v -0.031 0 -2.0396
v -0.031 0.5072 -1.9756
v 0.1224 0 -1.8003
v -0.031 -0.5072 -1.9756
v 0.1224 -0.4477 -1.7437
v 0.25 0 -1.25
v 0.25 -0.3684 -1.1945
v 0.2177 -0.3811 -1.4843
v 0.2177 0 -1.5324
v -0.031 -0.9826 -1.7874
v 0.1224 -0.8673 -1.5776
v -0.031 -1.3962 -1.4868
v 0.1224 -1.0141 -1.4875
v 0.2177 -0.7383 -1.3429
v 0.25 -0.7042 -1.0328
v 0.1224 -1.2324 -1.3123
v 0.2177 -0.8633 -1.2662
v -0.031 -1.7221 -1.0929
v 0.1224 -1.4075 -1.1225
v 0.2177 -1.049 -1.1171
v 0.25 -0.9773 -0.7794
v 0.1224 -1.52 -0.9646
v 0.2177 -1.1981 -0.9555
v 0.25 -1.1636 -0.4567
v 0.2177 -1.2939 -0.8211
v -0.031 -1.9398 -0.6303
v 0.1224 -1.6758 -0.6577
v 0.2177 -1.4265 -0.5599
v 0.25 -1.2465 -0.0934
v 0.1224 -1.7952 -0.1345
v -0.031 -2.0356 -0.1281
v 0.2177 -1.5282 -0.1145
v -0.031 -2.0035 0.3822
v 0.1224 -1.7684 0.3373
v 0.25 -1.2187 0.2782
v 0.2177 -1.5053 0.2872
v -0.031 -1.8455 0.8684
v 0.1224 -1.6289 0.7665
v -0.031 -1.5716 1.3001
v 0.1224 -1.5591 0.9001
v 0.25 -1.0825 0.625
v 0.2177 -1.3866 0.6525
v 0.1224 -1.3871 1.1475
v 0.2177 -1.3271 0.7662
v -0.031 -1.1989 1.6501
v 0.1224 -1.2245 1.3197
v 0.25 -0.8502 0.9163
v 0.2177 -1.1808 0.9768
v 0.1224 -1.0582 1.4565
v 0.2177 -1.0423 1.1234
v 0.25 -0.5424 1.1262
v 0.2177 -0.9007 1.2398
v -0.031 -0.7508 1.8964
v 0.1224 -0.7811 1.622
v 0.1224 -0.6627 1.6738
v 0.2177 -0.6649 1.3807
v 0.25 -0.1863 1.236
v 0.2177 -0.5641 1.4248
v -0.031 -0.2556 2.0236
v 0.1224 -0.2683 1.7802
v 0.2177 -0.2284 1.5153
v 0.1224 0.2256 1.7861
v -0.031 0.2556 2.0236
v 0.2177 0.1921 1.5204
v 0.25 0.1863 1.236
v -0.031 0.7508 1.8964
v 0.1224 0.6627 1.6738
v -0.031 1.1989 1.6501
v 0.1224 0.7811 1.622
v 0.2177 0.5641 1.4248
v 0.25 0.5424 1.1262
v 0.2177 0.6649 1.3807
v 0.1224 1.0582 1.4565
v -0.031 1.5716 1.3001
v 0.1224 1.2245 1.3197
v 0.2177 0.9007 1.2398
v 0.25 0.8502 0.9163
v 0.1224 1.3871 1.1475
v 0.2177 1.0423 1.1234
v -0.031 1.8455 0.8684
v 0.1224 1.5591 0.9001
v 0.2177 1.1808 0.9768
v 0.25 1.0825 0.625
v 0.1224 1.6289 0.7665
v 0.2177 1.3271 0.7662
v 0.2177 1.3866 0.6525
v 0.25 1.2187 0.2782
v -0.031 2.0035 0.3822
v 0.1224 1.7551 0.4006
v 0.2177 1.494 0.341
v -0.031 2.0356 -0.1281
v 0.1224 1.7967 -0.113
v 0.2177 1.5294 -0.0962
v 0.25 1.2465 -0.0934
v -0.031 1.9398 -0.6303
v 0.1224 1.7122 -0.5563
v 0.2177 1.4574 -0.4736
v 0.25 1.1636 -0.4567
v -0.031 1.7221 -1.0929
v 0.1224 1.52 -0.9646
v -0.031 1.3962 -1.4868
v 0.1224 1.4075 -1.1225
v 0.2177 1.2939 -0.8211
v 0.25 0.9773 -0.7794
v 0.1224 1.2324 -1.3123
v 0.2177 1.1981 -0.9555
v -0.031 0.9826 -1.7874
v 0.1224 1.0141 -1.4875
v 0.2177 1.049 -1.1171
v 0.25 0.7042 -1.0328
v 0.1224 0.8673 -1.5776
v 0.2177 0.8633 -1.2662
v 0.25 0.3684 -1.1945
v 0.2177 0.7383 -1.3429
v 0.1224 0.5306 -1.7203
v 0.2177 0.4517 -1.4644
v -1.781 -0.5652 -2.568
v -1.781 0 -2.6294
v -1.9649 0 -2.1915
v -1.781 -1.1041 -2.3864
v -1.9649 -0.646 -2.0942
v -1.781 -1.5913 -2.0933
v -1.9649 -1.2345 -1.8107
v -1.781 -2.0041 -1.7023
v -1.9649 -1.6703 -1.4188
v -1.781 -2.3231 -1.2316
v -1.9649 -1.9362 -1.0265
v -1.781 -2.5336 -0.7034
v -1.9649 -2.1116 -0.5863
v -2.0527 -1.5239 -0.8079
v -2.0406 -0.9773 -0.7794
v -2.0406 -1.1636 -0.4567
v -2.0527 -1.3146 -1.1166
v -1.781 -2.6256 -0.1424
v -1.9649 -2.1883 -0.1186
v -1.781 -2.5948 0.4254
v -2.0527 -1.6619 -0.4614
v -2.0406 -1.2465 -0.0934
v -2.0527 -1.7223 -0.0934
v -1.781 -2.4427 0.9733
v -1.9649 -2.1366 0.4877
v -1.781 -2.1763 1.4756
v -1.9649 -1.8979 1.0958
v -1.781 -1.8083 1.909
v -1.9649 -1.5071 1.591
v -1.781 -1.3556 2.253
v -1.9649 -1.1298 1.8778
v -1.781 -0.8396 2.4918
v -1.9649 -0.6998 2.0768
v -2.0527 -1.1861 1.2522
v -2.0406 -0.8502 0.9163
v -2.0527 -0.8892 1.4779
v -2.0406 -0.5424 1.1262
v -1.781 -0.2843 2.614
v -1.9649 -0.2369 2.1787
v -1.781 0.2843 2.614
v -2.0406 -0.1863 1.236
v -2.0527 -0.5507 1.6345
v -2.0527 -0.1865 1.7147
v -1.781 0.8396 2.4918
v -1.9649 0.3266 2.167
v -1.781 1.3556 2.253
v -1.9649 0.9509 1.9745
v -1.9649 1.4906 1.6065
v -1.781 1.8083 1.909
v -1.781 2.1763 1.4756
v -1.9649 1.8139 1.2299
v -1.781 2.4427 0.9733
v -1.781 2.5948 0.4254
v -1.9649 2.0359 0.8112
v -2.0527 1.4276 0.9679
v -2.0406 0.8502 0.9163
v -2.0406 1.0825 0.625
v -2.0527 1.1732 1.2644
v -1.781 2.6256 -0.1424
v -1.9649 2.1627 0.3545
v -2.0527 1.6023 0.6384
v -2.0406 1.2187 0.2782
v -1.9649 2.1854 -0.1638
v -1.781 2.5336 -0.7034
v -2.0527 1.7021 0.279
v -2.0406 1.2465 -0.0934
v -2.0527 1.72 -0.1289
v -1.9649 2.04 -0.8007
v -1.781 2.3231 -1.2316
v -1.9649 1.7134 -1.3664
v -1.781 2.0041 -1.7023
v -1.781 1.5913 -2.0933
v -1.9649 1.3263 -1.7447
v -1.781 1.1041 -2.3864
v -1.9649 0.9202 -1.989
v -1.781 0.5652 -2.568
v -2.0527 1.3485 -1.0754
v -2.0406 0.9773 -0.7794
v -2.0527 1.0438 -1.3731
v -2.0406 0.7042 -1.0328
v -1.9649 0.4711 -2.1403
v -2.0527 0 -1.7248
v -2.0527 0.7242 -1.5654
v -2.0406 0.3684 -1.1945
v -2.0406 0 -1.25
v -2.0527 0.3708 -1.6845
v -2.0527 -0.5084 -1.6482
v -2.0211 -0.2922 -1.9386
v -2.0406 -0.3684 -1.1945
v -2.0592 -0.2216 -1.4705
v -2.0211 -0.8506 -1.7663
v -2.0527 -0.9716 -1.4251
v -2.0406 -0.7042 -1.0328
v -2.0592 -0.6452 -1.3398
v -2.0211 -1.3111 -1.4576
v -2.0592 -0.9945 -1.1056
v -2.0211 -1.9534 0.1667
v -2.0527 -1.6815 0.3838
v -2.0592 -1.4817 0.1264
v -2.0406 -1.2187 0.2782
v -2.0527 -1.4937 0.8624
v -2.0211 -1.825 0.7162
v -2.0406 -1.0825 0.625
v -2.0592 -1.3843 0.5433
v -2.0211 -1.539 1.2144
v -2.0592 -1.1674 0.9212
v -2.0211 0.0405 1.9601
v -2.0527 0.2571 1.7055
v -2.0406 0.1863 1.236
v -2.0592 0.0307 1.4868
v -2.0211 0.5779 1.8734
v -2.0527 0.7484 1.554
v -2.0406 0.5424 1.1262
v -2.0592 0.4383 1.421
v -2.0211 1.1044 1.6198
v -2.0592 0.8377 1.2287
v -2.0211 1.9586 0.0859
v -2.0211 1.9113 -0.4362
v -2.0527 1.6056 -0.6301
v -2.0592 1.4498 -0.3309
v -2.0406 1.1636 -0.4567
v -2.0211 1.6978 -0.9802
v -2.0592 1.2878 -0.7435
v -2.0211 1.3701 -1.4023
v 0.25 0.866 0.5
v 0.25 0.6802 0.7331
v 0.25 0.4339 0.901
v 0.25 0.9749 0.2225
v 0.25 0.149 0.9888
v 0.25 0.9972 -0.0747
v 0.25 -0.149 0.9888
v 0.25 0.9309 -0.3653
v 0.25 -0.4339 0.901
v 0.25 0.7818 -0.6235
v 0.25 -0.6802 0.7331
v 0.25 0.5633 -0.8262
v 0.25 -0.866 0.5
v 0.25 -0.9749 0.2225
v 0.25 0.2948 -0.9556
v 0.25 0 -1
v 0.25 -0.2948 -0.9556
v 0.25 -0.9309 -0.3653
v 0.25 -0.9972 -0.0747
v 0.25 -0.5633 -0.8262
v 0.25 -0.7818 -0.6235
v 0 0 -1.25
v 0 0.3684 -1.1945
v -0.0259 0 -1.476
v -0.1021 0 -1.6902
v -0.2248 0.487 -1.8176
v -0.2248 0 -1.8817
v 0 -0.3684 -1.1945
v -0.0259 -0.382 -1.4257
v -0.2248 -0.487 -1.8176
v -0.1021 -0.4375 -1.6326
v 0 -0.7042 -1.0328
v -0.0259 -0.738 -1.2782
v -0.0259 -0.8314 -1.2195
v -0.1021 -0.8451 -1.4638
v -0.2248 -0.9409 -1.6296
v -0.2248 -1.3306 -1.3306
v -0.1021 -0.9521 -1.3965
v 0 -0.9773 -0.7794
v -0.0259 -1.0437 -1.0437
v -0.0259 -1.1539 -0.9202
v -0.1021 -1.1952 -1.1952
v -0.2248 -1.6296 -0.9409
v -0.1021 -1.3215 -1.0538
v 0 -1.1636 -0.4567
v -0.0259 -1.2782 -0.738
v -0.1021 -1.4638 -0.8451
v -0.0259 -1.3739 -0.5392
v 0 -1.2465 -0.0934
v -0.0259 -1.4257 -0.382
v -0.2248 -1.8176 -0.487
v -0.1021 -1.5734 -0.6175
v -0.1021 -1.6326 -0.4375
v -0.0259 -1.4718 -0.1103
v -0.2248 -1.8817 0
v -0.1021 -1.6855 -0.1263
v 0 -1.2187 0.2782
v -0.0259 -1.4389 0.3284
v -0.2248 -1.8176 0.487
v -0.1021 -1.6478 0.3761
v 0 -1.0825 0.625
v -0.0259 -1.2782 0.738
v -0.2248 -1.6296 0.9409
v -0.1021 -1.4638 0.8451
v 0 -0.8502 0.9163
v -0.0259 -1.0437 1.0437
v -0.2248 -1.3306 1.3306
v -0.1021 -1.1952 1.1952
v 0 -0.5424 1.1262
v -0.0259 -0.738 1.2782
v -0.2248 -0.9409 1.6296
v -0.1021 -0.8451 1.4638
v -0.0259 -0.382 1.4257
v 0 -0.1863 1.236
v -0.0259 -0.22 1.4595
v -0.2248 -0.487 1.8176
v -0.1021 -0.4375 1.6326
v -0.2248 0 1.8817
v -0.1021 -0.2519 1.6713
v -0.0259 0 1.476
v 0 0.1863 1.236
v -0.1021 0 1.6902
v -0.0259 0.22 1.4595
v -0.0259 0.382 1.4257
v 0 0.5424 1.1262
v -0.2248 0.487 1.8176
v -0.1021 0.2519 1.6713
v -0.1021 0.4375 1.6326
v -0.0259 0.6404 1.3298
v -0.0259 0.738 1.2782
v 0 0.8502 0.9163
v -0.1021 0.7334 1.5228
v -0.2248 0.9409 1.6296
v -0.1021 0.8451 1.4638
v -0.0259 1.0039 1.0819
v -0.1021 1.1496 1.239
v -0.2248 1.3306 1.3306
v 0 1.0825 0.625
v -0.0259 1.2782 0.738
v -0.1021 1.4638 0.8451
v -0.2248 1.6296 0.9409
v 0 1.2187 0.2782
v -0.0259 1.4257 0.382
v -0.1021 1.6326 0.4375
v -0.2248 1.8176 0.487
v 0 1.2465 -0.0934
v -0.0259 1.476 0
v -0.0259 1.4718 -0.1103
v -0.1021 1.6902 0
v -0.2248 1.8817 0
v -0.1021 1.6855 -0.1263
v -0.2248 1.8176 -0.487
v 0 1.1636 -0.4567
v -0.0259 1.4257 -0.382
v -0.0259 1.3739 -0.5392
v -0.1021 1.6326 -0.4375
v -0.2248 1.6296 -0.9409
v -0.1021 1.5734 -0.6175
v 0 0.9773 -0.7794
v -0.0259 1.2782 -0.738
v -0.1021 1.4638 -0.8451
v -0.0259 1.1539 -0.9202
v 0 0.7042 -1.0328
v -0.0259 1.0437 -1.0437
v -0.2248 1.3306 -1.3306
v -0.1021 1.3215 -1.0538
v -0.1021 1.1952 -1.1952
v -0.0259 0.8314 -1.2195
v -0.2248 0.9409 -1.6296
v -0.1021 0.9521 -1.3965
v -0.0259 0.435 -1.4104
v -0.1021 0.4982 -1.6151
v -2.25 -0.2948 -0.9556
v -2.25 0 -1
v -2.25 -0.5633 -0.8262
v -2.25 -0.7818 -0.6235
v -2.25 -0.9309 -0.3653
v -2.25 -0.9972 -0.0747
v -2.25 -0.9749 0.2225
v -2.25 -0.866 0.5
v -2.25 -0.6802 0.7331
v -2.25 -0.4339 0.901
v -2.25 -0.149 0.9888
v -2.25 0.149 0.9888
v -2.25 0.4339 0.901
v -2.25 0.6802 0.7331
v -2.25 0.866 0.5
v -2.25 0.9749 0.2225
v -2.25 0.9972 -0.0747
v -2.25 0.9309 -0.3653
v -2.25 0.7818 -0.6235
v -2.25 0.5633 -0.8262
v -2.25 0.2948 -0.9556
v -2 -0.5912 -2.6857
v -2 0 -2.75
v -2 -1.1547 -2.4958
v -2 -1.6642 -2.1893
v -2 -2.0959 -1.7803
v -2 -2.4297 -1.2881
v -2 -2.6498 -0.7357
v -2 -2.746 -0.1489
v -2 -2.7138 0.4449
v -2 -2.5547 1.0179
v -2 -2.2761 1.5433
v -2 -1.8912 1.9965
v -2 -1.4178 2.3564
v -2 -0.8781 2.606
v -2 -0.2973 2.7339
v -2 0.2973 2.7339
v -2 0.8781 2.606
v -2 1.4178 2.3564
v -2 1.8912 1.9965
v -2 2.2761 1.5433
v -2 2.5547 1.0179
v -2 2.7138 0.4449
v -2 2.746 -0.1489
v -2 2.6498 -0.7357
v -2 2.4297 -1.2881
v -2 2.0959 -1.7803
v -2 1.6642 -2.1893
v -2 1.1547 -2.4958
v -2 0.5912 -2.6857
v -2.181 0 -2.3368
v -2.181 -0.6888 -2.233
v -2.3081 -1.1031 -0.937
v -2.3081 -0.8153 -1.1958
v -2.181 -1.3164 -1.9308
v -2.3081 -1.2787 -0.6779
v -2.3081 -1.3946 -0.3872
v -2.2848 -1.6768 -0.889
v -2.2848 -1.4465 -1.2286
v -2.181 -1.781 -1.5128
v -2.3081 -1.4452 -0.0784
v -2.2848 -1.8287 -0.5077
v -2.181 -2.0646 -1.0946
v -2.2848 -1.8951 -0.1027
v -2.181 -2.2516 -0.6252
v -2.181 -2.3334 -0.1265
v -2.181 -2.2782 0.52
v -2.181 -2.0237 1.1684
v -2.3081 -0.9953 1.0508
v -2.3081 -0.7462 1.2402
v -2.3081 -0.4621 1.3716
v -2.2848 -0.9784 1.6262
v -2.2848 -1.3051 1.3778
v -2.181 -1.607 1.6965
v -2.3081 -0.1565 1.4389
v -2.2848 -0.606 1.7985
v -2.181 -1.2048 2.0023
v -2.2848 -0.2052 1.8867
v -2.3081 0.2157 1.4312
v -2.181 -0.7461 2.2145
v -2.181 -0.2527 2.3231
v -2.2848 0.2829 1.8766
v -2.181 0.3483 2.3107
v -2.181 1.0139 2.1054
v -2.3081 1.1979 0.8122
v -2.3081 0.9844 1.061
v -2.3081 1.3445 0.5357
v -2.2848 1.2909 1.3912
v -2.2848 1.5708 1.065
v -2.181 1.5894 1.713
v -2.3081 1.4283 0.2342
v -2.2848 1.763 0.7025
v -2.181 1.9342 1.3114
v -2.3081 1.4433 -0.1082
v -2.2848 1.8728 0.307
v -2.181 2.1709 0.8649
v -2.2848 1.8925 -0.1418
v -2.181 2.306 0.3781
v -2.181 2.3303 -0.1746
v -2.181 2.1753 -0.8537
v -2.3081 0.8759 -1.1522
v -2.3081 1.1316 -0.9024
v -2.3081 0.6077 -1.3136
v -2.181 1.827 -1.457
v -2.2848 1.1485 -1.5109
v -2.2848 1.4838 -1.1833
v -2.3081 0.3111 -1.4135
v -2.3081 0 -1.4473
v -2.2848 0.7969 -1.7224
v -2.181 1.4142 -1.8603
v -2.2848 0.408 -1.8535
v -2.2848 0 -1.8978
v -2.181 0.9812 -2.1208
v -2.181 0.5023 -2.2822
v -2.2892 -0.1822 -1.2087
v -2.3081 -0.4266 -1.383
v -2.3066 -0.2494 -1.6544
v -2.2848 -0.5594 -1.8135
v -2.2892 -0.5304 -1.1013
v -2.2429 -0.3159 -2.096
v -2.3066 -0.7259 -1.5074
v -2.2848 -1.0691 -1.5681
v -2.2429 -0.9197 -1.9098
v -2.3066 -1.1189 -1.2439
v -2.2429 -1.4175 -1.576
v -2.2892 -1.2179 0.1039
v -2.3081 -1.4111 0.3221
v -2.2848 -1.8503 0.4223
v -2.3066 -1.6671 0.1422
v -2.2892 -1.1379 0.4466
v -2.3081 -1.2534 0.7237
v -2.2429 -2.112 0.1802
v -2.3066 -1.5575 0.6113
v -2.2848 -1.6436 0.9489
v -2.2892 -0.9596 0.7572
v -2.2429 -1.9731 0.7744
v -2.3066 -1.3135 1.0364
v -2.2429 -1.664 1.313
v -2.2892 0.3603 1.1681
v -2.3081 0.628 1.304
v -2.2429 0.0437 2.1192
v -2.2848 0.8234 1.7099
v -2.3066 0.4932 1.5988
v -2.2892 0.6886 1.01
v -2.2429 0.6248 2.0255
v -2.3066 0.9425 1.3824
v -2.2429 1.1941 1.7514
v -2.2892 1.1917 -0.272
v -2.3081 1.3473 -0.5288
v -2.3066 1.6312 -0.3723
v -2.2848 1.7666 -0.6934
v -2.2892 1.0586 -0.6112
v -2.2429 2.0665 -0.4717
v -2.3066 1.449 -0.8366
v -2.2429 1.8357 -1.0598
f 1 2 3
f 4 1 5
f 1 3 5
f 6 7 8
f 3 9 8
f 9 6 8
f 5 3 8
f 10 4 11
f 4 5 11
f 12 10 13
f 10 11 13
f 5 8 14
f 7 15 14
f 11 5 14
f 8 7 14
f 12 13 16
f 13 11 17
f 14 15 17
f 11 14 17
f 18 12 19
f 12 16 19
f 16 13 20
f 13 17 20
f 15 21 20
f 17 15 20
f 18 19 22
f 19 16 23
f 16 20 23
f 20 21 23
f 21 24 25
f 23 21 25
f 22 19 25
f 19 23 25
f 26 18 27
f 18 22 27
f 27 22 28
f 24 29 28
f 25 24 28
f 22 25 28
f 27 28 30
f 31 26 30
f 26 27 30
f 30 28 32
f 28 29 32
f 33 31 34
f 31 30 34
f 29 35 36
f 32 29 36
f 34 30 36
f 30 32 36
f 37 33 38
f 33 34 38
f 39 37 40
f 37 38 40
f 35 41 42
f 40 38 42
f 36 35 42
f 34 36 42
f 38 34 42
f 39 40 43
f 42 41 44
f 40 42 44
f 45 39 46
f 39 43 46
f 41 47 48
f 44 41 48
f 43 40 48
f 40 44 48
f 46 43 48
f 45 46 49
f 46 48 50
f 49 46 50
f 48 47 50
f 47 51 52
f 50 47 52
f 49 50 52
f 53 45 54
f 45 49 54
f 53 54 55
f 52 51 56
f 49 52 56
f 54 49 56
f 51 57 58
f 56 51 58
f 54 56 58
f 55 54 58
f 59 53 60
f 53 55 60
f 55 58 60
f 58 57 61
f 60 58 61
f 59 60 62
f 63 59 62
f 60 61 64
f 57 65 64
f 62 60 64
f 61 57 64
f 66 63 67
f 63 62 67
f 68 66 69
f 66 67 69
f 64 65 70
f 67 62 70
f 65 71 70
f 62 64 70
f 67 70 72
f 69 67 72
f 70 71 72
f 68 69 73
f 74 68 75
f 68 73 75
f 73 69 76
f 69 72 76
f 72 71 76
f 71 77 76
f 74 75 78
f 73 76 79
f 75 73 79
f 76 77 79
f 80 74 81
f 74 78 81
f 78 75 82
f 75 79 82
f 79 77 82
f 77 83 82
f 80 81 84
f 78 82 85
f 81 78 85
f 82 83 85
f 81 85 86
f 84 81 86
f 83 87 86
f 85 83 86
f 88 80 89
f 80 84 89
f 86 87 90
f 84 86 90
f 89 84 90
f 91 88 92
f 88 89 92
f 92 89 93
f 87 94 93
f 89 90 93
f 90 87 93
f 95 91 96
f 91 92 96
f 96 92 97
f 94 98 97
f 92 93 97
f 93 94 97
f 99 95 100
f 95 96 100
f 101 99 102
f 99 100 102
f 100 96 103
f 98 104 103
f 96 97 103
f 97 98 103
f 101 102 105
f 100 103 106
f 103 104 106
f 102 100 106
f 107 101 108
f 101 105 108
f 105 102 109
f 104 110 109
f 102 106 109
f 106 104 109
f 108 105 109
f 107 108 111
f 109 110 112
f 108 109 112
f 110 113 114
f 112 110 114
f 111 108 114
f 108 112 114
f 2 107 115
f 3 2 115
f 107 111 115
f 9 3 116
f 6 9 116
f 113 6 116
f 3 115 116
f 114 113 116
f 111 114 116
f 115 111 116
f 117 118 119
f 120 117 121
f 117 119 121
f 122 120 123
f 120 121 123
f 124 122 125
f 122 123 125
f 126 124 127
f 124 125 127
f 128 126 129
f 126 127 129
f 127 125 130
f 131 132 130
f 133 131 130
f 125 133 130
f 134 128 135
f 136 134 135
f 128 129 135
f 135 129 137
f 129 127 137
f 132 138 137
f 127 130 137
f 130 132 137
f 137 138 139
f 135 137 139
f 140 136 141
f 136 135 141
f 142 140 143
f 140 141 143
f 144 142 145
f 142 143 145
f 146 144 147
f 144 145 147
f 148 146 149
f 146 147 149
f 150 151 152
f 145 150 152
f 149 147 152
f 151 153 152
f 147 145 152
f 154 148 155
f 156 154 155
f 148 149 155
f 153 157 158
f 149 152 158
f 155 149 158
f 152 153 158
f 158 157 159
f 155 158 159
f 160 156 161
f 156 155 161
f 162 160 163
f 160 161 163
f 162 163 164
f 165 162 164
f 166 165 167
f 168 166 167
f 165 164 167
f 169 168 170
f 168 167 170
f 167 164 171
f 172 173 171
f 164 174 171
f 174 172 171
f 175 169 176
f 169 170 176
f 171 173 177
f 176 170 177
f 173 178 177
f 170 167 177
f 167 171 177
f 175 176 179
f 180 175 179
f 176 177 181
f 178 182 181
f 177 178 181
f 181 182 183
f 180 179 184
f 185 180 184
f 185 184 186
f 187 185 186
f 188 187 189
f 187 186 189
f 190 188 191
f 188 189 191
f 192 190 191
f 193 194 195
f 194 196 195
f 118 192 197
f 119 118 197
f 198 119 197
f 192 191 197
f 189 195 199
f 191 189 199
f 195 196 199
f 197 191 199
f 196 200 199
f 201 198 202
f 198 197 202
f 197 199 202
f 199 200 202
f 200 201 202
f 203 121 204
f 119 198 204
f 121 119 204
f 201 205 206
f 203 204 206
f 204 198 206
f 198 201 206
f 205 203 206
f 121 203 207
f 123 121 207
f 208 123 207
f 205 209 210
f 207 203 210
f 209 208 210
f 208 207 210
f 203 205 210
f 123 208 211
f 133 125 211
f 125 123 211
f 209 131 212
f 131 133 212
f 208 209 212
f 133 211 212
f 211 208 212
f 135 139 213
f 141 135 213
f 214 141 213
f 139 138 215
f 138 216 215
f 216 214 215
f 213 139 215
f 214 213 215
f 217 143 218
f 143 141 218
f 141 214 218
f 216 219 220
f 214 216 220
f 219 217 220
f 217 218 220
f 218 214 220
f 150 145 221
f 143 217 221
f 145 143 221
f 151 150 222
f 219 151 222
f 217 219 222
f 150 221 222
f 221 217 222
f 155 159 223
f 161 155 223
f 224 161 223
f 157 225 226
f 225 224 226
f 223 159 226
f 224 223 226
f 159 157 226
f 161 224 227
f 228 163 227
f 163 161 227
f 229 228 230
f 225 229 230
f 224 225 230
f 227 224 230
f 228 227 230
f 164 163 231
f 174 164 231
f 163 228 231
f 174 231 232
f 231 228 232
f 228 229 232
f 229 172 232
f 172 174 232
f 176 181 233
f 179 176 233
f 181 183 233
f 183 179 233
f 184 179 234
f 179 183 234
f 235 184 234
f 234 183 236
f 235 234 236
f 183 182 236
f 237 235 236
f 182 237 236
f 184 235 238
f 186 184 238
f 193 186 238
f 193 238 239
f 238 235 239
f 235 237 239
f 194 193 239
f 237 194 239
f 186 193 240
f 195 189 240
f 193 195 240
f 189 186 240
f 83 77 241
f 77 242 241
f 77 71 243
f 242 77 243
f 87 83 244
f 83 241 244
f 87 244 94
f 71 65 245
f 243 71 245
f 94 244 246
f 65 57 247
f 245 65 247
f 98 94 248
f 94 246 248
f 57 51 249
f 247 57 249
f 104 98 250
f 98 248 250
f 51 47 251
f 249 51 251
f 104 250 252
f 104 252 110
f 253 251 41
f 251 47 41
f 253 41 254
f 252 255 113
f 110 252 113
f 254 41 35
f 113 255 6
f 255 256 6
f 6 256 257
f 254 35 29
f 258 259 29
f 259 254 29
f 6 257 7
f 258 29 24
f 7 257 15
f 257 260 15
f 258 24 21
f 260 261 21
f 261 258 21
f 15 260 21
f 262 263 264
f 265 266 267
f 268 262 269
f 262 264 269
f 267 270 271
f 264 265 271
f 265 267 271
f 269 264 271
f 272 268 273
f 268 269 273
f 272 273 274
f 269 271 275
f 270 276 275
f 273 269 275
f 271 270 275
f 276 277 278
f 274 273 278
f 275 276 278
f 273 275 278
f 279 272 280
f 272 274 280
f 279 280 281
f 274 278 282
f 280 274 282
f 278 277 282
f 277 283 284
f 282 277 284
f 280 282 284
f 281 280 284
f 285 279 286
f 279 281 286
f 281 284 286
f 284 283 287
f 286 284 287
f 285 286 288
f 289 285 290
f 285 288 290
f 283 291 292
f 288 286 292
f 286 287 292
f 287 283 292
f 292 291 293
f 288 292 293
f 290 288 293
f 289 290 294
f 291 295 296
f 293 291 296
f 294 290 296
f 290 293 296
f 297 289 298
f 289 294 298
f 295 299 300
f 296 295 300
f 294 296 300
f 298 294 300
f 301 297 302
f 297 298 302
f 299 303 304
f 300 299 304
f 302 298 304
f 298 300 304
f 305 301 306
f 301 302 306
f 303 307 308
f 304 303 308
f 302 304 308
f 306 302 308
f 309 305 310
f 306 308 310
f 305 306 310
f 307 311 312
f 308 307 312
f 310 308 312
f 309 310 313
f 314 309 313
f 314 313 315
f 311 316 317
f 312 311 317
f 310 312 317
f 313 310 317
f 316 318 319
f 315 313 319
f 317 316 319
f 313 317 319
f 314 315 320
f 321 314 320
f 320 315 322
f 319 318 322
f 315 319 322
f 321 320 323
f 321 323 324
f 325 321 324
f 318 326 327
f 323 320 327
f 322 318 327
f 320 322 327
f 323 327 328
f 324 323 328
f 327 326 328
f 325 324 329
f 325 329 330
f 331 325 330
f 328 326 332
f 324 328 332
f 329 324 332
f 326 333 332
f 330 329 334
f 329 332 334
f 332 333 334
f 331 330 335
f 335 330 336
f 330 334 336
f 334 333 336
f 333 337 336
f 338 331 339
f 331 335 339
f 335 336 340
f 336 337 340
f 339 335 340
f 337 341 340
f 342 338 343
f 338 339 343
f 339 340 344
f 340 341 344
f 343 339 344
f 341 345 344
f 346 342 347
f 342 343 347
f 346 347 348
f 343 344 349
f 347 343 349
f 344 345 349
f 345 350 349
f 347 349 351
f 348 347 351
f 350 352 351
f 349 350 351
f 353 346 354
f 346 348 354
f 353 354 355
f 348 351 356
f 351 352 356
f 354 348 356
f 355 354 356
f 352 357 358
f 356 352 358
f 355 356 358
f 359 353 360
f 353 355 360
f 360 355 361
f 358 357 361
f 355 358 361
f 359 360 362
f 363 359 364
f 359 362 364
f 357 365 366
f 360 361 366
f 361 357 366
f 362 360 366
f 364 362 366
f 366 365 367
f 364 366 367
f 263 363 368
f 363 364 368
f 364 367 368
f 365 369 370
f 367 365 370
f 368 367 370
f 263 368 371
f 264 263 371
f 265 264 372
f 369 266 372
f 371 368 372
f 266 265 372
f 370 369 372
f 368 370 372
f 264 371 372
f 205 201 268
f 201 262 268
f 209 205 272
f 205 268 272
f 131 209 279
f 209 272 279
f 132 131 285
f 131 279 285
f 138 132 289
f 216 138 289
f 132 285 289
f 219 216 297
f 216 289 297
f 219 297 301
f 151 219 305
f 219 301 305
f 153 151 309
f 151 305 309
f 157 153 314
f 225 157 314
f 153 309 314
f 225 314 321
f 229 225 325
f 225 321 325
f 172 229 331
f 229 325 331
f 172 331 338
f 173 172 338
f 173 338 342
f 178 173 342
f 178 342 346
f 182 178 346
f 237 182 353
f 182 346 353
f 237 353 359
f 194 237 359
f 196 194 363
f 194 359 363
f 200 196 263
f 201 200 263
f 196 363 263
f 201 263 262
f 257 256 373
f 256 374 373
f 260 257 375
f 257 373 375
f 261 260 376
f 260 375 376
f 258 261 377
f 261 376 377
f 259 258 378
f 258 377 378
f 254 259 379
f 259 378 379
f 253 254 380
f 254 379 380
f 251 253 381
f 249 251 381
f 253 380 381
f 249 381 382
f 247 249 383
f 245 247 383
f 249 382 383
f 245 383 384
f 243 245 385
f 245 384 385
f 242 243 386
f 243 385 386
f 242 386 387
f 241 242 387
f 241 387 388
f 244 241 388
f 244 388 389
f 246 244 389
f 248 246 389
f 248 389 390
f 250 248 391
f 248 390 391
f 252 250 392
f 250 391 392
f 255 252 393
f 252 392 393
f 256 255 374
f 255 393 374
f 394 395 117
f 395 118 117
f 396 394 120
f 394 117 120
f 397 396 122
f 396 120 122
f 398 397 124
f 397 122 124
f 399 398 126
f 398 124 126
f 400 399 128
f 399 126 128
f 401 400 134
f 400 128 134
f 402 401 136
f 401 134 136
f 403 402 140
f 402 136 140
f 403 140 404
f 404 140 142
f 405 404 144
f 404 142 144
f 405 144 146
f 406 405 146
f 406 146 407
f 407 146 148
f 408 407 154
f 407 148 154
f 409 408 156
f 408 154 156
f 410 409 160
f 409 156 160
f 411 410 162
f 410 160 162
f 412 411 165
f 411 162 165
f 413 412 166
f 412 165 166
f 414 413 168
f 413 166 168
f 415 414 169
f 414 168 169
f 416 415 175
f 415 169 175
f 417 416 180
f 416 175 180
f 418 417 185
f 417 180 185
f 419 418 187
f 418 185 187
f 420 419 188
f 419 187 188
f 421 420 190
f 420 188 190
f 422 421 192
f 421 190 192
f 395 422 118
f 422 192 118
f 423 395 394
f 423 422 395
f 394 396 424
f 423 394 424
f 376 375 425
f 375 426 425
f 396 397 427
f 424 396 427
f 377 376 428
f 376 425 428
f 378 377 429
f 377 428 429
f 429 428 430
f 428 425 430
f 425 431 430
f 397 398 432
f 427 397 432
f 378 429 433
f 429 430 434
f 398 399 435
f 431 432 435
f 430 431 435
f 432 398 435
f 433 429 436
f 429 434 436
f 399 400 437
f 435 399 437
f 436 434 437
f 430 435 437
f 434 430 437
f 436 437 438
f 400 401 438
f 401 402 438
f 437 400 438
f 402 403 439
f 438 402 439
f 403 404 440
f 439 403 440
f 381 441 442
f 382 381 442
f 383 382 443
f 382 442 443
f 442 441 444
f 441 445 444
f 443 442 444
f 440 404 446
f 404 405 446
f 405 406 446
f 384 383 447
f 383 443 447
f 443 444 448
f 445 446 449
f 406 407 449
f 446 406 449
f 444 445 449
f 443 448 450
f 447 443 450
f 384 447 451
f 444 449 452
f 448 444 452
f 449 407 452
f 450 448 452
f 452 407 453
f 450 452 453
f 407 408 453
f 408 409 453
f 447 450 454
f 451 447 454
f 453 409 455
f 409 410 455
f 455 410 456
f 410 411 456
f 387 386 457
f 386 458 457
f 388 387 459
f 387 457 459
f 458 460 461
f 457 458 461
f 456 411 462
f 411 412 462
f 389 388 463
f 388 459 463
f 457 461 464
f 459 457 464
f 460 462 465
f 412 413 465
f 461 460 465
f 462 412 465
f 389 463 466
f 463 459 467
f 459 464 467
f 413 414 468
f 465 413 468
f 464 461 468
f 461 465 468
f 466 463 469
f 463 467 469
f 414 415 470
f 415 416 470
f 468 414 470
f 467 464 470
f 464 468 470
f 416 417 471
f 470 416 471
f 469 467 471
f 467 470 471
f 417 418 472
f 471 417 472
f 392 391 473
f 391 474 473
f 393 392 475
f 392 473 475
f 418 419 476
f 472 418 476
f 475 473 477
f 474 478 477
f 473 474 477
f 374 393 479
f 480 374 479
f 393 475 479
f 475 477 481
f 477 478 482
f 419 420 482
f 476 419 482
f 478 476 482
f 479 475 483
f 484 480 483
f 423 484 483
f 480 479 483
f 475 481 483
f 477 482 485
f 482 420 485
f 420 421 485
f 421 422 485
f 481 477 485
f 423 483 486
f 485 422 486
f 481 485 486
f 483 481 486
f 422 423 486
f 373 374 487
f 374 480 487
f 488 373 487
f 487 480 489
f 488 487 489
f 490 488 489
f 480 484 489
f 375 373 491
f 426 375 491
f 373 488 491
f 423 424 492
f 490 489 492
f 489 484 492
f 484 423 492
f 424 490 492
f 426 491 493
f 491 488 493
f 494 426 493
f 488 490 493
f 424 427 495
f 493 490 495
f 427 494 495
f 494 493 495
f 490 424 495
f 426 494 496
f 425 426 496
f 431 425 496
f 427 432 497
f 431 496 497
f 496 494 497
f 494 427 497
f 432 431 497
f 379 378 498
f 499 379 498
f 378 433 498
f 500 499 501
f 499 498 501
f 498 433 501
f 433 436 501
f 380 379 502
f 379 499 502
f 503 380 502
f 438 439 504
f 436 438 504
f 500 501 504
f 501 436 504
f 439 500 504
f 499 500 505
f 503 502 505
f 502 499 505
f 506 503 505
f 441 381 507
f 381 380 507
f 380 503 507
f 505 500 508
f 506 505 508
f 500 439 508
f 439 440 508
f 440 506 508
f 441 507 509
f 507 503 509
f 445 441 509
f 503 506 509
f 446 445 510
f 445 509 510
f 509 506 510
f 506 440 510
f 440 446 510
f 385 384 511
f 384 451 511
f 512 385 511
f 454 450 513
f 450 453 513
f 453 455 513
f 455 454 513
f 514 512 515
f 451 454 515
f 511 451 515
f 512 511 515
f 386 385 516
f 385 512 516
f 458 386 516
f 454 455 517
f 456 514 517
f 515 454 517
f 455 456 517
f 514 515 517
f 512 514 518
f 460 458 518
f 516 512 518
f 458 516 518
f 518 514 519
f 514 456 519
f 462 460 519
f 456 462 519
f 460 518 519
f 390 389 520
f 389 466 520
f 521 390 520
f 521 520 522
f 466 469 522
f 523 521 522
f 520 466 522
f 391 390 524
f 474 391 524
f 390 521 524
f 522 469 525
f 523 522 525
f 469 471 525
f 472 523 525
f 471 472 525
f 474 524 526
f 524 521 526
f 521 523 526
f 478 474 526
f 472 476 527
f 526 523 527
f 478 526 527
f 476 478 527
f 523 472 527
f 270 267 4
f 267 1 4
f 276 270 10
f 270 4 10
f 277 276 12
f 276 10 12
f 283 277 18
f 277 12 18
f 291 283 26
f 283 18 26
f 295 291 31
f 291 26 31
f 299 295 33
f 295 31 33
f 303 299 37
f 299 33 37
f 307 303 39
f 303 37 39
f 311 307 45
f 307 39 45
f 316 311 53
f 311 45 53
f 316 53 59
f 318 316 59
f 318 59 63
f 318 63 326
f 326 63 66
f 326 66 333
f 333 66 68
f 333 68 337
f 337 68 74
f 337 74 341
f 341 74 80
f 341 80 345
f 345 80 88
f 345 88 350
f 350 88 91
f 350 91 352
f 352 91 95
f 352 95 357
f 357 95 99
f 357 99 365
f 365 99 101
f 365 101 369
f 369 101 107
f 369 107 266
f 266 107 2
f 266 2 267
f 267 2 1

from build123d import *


with BuildPart() as part:
    # Sketch1 → Revolve1 (revolve)
    with BuildSketch(Plane.XY, mode=Mode.PRIVATE) as revolve1_sk:
        with BuildLine():
            ThreePointArc((0, 1.25), (-0.057874055, 1.58525916), (-0.224797408, 1.881712705))
            Line((-0.224797408, 1.881712705), (-0.03099676, 2.039640881))
            ThreePointArc((-0.03099676, 2.039640881), (0.177657431, 1.66907395), (0.25, 1.25))
            Line((0.25, 1.25), (0.25, 1))
            Line((0.25, 1), (0, 1))
            Line((0, 1), (-2, 1))
            Line((-2, 1), (-2.25, 1))
            ThreePointArc((-2.25, 1), (-2.284841337, 1.897834477), (-2, 2.75))
            Line((-2, 2.75), (-1.78099676, 2.629428109))
            ThreePointArc((-1.78099676, 2.629428109), (-2.021139042, 1.960479194), (-2.040639843, 1.25))
            Line((-2.040639843, 1.25), (0, 1.25))
        make_face()
    revolve(revolve1_sk.sketch.rotate(Axis((0, 0, 0), (-1, 0, 0)), 90), axis=Axis((0, 0, 0), (-1, 0, 0)))


solid = part.part
